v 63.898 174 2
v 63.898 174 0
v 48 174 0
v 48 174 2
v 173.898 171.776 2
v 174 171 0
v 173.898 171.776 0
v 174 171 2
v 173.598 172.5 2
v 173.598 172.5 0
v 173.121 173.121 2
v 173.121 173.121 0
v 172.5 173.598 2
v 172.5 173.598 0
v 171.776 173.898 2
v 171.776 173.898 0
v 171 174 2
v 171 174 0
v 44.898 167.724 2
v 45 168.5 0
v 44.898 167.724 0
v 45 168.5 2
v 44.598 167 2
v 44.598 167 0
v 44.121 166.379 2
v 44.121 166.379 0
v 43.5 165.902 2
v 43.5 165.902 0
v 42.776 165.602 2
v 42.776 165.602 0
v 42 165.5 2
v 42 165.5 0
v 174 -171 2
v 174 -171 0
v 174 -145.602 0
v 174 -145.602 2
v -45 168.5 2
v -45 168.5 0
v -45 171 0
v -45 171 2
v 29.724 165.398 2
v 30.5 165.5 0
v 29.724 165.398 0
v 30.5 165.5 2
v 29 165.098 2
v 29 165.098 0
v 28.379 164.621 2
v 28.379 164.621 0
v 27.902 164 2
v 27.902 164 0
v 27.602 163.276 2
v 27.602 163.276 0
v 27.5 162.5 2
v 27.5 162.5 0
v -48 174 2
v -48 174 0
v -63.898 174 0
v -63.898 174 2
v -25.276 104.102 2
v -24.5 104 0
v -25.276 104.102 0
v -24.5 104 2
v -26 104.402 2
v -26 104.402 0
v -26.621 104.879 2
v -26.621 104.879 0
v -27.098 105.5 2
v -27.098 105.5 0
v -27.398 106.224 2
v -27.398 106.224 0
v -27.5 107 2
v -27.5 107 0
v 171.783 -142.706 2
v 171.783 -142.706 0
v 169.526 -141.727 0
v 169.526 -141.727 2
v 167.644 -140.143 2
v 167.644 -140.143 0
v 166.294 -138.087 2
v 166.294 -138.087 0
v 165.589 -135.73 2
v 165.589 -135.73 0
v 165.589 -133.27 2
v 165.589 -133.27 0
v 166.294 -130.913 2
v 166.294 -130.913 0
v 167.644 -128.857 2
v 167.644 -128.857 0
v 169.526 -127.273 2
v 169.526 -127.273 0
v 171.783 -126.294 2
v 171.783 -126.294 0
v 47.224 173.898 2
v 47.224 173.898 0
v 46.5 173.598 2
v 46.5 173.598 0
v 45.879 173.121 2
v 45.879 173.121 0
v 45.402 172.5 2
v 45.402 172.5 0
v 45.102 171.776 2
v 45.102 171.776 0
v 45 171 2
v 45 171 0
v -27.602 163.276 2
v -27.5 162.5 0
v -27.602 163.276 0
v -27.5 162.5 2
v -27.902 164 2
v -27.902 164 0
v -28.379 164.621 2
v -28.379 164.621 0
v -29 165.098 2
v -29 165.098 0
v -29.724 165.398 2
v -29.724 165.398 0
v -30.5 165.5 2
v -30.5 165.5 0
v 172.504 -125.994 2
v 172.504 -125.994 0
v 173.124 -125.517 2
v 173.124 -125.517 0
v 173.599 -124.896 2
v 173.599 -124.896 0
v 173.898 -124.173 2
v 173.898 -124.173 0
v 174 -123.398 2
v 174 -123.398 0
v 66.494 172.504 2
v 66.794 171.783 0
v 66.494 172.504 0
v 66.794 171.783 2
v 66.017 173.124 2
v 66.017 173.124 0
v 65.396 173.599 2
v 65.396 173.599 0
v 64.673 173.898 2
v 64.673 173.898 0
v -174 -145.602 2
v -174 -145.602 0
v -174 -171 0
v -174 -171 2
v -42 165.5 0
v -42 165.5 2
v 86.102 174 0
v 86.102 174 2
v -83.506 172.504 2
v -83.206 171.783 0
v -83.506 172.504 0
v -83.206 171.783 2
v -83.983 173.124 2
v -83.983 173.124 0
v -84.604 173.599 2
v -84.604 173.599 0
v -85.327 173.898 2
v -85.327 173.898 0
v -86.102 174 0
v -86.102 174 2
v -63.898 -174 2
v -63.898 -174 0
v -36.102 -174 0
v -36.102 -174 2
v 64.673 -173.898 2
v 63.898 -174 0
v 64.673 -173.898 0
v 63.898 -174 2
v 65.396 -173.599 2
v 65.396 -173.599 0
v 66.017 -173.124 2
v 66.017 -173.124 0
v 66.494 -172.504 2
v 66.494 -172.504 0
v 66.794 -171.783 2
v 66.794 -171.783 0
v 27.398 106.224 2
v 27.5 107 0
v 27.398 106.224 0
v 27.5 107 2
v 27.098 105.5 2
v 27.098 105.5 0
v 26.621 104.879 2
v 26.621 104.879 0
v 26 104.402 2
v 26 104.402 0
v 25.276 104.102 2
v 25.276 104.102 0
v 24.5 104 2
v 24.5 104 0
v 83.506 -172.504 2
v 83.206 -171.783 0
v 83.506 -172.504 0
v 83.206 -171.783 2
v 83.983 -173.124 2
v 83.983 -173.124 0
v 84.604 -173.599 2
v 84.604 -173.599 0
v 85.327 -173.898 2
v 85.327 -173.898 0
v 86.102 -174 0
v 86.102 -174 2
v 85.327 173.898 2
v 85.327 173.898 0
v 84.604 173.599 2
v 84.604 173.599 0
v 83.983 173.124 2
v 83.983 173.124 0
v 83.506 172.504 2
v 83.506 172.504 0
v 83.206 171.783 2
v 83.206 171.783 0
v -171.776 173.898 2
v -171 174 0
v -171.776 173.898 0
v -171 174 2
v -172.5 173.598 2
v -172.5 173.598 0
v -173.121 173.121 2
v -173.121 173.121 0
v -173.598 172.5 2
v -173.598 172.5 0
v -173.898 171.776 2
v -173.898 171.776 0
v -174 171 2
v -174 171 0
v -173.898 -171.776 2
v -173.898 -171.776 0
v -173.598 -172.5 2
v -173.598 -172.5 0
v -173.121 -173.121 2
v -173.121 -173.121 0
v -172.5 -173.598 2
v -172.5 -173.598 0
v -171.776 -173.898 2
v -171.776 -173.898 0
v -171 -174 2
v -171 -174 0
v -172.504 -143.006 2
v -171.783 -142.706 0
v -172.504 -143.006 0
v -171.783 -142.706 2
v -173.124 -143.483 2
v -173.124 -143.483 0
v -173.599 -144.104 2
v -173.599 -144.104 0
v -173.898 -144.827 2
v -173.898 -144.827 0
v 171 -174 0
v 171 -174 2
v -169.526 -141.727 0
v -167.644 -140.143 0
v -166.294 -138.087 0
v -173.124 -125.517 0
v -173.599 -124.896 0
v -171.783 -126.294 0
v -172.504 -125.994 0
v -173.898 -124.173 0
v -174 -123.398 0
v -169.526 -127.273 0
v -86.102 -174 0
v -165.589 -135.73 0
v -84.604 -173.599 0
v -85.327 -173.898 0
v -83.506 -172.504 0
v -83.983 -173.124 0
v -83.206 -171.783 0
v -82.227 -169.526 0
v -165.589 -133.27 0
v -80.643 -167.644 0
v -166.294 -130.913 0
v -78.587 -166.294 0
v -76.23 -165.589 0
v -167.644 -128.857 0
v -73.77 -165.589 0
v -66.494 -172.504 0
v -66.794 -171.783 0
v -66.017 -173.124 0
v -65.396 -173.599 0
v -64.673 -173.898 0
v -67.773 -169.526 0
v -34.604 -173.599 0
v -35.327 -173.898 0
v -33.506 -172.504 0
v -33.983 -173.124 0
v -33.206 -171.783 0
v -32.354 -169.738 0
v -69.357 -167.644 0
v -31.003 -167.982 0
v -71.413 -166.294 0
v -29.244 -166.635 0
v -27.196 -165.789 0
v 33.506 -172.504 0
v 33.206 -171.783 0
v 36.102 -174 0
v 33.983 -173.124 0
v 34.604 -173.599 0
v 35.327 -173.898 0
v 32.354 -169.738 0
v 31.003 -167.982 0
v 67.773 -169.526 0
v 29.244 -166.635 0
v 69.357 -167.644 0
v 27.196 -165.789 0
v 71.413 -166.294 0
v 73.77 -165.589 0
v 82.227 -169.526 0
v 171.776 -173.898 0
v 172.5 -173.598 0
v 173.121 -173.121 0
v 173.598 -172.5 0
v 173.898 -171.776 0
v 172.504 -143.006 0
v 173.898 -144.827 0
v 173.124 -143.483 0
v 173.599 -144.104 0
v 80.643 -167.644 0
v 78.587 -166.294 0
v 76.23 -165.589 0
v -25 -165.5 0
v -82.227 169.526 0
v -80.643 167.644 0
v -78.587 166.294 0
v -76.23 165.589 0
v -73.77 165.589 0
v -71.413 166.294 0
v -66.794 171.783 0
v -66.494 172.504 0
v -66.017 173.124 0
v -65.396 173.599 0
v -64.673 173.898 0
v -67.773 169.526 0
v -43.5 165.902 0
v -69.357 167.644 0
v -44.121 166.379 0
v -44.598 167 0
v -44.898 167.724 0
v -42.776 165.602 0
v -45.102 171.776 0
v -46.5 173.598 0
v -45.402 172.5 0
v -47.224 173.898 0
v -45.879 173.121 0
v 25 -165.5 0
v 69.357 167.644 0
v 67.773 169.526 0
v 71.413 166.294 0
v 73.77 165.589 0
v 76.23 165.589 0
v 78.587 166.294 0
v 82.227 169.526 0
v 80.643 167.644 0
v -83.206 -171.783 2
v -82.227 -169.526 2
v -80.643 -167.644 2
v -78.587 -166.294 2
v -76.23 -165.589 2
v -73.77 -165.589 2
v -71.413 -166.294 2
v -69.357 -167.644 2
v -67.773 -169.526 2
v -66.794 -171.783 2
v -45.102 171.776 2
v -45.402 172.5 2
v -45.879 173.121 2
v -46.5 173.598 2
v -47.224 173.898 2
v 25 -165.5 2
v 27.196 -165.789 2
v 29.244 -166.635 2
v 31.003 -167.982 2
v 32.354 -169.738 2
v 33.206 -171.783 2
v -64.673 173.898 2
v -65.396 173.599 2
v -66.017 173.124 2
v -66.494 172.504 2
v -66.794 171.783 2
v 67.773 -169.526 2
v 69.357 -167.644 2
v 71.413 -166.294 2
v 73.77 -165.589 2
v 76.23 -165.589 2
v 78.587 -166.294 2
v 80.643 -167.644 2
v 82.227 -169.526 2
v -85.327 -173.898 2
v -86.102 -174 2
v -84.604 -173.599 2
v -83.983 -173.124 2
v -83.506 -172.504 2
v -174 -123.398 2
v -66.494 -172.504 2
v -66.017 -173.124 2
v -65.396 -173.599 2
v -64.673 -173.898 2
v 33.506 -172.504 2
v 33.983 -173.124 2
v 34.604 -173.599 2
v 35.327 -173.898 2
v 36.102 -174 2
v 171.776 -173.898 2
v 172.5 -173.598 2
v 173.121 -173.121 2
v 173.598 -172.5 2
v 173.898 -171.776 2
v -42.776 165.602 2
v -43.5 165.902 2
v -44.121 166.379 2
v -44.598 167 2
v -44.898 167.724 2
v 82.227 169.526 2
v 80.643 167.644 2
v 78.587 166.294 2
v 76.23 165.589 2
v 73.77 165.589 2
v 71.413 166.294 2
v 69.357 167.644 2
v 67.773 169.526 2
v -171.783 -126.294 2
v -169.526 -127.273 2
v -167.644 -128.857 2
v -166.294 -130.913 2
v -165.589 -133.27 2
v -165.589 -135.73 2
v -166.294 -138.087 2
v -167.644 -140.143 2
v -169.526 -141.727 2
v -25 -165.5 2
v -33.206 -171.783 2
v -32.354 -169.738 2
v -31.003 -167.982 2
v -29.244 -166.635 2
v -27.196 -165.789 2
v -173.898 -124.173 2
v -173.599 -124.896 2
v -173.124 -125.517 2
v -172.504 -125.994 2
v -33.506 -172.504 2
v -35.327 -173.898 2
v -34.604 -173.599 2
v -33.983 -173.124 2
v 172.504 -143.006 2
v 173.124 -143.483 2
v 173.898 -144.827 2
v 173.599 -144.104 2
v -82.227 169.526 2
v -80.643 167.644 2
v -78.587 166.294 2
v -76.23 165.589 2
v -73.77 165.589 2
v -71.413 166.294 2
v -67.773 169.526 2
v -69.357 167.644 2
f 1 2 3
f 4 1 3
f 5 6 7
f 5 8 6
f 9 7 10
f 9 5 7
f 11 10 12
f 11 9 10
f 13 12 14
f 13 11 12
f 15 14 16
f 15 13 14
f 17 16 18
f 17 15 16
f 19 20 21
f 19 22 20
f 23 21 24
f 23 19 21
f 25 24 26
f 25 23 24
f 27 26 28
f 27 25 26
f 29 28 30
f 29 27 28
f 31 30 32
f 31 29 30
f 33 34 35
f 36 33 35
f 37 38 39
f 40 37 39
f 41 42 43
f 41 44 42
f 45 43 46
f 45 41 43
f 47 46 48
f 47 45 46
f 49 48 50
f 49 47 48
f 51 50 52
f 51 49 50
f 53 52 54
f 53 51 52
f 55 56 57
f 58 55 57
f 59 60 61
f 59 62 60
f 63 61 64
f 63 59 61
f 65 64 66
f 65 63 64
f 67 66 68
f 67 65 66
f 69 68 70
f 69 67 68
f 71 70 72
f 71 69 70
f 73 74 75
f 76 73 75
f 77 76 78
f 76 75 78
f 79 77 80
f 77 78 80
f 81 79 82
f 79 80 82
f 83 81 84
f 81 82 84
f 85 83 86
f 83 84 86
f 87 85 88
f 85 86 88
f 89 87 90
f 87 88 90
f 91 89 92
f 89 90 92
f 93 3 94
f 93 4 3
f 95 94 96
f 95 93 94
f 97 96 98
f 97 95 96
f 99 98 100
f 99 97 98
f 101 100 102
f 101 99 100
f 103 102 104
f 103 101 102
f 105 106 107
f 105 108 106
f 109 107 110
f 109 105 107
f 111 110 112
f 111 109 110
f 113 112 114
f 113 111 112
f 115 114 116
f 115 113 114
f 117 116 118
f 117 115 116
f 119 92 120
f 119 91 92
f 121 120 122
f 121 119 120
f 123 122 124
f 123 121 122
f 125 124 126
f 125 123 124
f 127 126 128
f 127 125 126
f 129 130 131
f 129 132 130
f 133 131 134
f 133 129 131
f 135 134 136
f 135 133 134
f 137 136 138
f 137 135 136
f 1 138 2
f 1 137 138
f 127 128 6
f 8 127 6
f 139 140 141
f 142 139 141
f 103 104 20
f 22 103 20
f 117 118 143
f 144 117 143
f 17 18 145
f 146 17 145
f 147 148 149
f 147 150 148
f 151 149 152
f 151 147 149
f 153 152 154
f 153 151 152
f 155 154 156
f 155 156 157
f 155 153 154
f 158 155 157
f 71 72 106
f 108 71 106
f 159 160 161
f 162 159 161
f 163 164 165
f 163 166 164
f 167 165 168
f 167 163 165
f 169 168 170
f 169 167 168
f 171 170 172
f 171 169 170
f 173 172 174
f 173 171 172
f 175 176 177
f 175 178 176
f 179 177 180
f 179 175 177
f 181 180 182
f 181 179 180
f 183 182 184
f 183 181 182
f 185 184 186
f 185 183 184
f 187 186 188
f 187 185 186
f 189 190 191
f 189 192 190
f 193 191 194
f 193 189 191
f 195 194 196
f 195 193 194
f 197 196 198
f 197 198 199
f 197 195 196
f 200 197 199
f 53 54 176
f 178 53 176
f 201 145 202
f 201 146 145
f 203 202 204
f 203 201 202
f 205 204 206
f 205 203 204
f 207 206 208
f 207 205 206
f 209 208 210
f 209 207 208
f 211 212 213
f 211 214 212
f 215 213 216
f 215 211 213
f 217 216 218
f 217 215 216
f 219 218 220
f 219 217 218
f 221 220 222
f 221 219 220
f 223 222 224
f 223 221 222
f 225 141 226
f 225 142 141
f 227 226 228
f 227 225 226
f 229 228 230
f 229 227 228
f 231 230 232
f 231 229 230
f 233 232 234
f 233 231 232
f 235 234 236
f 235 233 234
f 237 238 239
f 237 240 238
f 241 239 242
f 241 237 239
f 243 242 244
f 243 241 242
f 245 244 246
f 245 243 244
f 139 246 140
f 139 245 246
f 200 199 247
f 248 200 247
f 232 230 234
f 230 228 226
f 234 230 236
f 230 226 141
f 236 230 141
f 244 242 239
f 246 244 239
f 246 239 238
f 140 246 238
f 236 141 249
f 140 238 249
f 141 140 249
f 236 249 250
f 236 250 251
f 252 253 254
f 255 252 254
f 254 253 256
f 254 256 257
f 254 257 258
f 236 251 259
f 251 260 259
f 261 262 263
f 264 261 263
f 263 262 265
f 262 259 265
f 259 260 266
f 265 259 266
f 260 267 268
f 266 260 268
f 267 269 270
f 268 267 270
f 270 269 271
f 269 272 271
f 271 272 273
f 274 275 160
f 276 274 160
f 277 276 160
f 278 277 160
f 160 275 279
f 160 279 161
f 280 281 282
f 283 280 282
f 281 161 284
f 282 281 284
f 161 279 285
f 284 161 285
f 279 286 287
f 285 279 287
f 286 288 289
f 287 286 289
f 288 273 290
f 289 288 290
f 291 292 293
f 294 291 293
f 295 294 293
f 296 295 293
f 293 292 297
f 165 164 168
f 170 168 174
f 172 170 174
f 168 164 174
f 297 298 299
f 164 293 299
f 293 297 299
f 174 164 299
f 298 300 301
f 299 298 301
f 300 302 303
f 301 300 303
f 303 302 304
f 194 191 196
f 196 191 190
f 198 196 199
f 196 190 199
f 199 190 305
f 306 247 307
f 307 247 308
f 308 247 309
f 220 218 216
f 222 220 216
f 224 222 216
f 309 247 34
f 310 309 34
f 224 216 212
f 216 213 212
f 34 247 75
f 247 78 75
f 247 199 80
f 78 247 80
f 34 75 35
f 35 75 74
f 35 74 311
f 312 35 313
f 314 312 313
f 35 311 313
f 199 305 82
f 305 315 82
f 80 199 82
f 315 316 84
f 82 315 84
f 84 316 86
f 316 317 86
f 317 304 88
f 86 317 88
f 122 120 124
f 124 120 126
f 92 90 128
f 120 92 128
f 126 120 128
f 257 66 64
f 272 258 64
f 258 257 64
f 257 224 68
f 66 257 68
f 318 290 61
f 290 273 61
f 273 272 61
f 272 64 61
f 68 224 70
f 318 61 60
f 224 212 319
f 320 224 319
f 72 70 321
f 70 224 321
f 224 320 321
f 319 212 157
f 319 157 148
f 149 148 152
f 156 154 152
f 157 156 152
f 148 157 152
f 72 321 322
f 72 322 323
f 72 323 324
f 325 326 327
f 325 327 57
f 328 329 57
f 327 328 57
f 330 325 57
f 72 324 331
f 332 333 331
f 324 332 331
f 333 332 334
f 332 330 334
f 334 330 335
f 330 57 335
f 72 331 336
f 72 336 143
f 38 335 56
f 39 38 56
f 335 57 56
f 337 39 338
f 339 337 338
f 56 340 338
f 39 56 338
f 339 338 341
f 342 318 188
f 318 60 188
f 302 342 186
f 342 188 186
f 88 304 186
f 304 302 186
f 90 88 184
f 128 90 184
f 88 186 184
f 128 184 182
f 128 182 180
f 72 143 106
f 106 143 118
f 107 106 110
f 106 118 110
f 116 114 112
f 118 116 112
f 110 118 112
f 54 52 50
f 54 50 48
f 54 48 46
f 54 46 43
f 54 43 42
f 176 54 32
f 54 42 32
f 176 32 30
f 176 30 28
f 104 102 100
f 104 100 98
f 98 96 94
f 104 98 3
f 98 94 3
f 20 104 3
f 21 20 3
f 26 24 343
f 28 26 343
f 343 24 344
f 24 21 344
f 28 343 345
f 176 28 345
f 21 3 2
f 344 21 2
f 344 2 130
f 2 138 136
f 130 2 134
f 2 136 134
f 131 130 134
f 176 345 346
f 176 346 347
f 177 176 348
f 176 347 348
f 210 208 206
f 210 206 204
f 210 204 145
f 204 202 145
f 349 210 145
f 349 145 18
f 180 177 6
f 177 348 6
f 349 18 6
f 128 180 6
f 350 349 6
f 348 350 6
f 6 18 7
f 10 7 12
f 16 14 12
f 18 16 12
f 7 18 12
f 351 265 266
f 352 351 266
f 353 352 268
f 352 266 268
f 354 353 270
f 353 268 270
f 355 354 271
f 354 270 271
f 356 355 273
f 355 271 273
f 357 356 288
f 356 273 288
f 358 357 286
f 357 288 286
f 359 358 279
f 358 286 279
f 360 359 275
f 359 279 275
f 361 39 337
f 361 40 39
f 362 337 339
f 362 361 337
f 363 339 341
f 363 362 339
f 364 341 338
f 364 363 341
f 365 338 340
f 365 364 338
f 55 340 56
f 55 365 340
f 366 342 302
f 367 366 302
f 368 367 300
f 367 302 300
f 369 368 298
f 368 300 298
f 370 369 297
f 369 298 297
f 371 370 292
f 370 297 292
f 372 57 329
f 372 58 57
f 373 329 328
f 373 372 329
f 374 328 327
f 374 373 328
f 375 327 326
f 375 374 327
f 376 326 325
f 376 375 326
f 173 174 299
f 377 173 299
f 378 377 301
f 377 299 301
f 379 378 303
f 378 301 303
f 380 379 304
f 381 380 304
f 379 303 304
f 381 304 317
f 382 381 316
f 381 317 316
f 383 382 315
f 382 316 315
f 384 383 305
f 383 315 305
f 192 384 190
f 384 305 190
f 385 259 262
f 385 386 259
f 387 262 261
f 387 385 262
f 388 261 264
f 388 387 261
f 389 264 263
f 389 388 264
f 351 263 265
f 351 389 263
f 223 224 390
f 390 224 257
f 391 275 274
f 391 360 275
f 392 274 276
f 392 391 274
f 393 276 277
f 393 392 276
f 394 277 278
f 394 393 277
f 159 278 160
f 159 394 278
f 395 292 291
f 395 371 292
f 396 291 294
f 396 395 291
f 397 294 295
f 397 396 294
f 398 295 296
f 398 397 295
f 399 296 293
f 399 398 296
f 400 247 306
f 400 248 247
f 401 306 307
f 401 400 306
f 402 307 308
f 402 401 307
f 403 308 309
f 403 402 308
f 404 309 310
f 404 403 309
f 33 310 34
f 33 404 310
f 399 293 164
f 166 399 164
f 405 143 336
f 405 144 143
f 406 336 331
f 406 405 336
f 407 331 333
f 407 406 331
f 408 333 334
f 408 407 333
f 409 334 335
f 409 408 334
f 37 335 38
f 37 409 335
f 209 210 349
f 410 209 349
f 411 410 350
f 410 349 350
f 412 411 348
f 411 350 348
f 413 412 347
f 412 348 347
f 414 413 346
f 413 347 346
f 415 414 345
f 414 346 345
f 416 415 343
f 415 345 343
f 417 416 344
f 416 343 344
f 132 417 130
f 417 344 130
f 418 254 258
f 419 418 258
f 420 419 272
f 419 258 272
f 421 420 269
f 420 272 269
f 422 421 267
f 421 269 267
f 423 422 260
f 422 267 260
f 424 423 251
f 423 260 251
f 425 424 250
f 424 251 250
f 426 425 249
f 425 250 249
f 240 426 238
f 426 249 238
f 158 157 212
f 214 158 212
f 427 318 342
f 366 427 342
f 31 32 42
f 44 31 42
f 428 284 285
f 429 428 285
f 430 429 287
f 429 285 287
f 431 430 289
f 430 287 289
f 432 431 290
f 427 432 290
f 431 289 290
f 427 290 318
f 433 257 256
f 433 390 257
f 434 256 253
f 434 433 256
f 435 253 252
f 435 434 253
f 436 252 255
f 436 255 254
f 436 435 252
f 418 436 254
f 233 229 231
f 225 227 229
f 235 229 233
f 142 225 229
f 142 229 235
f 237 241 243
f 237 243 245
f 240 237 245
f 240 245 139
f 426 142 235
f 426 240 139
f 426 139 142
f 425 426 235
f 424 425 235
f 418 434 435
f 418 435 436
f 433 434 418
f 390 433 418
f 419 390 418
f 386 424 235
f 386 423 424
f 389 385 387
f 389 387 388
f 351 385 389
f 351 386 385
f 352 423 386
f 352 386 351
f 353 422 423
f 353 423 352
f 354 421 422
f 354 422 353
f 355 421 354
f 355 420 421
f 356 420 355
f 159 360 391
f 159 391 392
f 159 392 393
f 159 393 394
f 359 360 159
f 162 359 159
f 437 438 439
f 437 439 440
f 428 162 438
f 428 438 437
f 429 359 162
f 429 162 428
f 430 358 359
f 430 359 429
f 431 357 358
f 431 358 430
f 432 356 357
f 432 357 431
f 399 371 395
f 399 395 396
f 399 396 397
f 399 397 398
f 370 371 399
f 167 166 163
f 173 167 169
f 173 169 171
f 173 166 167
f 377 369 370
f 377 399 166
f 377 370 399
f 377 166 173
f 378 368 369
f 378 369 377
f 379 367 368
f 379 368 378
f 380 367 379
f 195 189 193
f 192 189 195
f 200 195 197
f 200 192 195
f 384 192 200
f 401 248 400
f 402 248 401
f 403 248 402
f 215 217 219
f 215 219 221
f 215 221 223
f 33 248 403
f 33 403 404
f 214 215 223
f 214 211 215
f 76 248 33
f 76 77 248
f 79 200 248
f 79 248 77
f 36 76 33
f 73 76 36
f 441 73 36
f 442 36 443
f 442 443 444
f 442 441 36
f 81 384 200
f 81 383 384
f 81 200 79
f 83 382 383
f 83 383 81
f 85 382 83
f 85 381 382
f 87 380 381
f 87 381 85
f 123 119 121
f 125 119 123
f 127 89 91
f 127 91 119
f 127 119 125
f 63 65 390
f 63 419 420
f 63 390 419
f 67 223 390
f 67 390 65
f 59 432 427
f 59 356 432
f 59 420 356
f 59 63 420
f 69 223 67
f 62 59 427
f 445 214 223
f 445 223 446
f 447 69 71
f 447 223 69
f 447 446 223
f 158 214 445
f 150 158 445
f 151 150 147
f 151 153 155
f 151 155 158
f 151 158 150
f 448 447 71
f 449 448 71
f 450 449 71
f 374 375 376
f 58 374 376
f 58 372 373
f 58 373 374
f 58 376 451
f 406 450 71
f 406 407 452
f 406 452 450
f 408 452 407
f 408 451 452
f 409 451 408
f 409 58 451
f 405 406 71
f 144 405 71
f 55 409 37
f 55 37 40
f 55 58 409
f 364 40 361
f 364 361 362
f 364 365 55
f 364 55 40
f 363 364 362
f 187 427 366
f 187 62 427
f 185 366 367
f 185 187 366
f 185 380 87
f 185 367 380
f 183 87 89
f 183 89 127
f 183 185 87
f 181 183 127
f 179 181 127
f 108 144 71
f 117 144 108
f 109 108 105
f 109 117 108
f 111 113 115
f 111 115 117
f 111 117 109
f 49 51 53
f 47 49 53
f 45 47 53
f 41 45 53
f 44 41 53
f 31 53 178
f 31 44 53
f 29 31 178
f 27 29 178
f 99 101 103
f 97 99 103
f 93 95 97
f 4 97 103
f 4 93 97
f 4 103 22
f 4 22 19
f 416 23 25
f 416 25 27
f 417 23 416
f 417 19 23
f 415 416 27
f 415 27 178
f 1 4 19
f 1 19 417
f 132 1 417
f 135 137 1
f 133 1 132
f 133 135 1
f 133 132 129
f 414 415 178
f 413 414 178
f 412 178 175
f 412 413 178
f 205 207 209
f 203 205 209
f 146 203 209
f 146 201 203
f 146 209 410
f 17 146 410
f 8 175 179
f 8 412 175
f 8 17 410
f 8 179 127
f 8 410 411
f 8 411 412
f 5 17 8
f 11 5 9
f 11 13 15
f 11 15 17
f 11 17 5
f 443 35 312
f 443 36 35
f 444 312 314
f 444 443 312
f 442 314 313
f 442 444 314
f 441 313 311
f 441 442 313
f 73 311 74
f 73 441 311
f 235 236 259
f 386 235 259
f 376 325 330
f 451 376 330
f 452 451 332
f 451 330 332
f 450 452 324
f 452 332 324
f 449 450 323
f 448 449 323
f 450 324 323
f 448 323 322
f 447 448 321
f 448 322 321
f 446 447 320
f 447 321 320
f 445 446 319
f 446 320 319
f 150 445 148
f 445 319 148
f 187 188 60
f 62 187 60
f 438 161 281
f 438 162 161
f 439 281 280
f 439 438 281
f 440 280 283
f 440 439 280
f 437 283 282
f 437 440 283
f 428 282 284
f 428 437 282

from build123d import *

# Parameters (mm, degrees)
BOSS_EXTRUDE1_DEPTH = 2
FILLET1_R           = 3


with BuildPart() as part:
    # Sketch2 → Boss-Extrude1 (new body)
    with BuildSketch(Plane.XY):
        with BuildLine():
            Line((-25, -165.5), (25, -165.5))
            ThreePointArc((25, -165.5), (31.01040764, -167.98959236), (33.5, -174))
            Line((33.5, -174), (66.5, -174))
            ThreePointArc((66.5, -174), (75, -165.5), (83.5, -174))
            Line((83.5, -174), (174, -174))
            Line((174, -174), (174, -143))
            ThreePointArc((174, -143), (165.5, -134.5), (174, -126))
            Line((174, -126), (174, 174))
            Line((174, 174), (83.5, 174))
            ThreePointArc((83.5, 174), (75, 165.5), (66.5, 174))
            Line((66.5, 174), (45, 174))
            Line((45, 174), (45, 165.5))
            Line((45, 165.5), (27.5, 165.5))
            Line((27.5, 165.5), (27.5, 104))
            Line((27.5, 104), (-27.5, 104))
            Line((-27.5, 104), (-27.5, 165.5))
            Line((-27.5, 165.5), (-45, 165.5))
            Line((-45, 165.5), (-45, 174))
            Line((-45, 174), (-66.5, 174))
            ThreePointArc((-66.5, 174), (-75, 165.5), (-83.5, 174))
            Line((-83.5, 174), (-174, 174))
            Line((-174, 174), (-174, -126))
            ThreePointArc((-174, -126), (-165.5, -134.5), (-174, -143))
            Line((-174, -143), (-174, -174))
            Line((-174, -174), (-83.5, -174))
            ThreePointArc((-83.5, -174), (-75, -165.5), (-66.5, -174))
            Line((-66.5, -174), (-33.5, -174))
            ThreePointArc((-33.5, -174), (-31.01040764, -167.98959236), (-25, -165.5))
        make_face()
    extrude(amount=BOSS_EXTRUDE1_DEPTH)

    # Fillet1
    fillet1_edges = [part.edges().sort_by_distance(p)[0] for p in [
        (174, -174, 1),
        (83.5, -174, 1),
        (66.5, -174, 1),
        (33.5, -174, 1),
        (-33.5, -174, 1),
        (-66.5, -174, 1),
        (-83.5, -174, 1),
        (-174, -174, 1),
        (-174, -143, 1),
        (-174, -126, 1),
        (-174, 174, 1),
        (-83.5, 174, 1),
        (-66.5, 174, 1),
        (-45, 174, 1),
        (-45, 165.5, 1),
        (-27.5, 165.5, 1),
        (-27.5, 104, 1),
        (27.5, 104, 1),
        (27.5, 165.5, 1),
        (45, 165.5, 1),
        (45, 174, 1),
        (66.5, 174, 1),
        (83.5, 174, 1),
        (174, 174, 1),
        (174, -126, 1),
        (174, -143, 1),
    ]]
    fillet(fillet1_edges, radius=FILLET1_R)


solid = part.part
